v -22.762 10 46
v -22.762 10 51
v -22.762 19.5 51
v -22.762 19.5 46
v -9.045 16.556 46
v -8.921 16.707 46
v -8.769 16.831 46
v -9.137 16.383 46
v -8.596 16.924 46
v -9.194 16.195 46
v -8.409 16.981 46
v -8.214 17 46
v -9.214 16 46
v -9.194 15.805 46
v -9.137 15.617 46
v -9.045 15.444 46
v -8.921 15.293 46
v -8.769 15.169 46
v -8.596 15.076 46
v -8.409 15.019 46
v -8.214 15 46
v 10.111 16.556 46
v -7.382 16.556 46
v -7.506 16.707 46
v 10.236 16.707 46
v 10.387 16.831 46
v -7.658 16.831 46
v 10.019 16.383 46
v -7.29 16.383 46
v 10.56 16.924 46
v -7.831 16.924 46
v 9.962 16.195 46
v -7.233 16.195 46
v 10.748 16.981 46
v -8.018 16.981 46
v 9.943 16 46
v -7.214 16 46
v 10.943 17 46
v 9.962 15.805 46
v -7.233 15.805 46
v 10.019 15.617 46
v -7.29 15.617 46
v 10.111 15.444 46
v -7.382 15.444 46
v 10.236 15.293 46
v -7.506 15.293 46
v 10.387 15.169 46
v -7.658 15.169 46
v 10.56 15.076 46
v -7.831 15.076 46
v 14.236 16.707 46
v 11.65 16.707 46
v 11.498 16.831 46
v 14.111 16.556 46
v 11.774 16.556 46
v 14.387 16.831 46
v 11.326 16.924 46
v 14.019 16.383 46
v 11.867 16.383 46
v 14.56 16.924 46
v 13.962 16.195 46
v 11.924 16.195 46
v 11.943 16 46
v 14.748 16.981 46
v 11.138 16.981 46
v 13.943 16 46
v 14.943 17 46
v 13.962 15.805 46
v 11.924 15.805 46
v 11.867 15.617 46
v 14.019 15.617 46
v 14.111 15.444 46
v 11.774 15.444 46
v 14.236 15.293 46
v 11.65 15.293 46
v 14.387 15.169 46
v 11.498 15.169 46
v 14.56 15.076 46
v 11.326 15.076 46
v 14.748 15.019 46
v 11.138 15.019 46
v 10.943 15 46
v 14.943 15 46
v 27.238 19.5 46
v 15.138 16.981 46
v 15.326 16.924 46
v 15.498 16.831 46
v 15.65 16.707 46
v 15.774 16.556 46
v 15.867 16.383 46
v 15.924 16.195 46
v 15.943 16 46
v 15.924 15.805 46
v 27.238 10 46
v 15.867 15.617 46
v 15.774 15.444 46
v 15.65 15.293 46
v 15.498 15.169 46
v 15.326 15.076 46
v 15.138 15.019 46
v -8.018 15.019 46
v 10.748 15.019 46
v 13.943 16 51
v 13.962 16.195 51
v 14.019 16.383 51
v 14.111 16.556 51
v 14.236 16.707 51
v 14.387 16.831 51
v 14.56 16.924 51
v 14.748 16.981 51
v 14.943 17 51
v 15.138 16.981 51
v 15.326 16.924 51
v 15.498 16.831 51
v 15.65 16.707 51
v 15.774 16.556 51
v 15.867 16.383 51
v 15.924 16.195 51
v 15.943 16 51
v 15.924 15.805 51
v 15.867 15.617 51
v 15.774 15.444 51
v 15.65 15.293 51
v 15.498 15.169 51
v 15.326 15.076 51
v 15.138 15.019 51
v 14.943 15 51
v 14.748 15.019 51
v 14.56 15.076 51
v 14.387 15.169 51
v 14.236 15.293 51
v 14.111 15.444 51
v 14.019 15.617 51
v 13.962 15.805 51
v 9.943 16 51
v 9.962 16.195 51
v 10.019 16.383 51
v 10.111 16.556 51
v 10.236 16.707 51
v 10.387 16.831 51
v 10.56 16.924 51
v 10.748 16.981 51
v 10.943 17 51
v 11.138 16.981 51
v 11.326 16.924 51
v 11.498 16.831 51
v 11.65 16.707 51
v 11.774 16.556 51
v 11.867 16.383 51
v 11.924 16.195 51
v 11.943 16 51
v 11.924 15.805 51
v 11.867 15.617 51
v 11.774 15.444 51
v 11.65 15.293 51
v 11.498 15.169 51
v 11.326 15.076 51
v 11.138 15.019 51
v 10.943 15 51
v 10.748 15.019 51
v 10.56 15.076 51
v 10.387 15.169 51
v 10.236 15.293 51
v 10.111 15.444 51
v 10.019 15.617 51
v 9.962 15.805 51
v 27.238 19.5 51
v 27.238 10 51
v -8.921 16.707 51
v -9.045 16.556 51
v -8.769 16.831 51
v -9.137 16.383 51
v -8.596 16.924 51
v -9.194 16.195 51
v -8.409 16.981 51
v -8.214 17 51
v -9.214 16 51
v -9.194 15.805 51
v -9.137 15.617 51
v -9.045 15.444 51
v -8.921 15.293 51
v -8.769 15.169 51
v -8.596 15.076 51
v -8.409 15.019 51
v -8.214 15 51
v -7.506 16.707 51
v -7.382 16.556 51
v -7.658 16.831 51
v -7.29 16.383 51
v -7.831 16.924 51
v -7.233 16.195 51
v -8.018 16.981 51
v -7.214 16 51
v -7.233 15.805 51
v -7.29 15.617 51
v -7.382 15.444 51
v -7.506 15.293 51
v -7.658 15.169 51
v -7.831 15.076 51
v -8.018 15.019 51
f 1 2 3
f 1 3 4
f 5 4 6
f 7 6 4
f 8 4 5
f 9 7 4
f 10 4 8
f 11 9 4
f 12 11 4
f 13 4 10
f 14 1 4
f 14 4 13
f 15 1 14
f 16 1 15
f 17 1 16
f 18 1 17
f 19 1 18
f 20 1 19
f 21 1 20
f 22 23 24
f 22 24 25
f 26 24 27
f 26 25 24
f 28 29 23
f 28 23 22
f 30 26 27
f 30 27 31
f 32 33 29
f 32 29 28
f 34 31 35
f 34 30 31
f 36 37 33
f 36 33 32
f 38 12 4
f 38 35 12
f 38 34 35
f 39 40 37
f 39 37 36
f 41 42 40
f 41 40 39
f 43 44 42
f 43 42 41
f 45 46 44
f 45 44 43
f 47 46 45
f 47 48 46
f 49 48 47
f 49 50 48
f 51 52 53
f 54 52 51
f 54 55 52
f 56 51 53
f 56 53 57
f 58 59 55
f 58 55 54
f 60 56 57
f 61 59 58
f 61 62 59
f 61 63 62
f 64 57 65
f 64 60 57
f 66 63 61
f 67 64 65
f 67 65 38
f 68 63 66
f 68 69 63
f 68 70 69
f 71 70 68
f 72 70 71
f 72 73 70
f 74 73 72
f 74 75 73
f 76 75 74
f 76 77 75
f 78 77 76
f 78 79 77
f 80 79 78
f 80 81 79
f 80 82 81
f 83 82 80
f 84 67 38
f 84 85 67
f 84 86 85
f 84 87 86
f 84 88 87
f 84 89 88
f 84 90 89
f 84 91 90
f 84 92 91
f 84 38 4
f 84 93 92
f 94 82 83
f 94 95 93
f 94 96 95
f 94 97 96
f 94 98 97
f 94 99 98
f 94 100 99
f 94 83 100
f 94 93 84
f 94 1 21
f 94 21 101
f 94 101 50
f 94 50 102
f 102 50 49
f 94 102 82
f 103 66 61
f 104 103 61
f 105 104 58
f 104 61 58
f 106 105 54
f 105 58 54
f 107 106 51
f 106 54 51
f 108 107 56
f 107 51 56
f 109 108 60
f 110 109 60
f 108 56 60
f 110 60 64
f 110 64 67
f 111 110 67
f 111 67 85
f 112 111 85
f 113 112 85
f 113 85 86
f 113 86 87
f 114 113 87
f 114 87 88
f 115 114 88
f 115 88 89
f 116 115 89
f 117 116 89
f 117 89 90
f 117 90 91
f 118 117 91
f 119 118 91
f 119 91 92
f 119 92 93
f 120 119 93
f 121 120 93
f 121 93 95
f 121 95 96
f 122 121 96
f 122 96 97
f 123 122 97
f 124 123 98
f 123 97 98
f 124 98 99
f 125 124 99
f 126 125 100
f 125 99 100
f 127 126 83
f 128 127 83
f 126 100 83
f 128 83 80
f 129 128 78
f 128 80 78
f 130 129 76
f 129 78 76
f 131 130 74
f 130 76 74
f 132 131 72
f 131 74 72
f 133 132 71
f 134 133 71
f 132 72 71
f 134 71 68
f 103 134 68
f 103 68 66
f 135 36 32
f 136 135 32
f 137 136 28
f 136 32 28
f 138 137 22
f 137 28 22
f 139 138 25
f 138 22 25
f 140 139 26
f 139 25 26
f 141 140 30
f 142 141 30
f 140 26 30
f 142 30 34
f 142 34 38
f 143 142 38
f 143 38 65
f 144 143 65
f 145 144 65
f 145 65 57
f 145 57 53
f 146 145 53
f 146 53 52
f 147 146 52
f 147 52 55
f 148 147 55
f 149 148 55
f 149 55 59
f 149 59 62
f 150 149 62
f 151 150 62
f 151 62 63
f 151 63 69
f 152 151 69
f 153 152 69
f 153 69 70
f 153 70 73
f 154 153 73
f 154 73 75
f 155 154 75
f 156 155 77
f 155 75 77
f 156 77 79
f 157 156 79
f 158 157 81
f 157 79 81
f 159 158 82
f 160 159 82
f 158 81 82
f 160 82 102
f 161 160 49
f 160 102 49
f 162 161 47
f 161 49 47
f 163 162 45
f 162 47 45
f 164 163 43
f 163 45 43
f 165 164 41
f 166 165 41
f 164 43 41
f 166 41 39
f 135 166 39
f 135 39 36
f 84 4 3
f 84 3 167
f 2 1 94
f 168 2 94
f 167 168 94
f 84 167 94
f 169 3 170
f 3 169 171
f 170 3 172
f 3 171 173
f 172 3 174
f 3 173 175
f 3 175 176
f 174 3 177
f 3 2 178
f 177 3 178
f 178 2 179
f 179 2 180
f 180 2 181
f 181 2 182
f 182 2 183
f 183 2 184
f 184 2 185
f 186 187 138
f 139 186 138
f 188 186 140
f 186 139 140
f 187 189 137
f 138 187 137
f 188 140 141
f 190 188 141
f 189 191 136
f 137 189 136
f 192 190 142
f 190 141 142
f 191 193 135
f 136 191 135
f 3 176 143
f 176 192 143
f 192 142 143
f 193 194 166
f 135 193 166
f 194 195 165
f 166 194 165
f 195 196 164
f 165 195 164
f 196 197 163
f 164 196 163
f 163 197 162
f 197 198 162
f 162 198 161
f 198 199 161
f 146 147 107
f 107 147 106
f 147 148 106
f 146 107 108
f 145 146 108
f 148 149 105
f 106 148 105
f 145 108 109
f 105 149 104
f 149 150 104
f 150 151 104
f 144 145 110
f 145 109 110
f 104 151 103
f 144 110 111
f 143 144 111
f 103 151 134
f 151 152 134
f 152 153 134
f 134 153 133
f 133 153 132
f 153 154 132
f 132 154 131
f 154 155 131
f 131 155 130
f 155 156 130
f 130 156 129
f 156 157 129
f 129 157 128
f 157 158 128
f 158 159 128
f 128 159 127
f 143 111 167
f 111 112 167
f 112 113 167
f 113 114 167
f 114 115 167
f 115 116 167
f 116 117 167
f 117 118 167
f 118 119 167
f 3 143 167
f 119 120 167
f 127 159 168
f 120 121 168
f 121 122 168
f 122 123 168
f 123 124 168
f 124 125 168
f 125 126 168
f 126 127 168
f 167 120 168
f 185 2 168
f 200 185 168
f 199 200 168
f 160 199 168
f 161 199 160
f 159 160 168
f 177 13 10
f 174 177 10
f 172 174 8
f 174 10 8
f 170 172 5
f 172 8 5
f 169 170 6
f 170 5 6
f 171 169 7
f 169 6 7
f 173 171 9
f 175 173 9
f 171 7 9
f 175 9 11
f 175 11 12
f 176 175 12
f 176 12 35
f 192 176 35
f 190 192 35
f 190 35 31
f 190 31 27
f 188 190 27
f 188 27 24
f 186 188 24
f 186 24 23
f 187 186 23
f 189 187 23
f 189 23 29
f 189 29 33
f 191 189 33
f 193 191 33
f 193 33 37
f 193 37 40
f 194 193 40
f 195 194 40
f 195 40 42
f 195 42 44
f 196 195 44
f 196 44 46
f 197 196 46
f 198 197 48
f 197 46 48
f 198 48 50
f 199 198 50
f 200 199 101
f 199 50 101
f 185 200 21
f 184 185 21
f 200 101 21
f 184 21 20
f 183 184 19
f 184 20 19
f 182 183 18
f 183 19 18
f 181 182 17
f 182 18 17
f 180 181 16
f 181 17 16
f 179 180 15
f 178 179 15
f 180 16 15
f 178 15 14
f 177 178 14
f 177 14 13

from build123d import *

# Parameters (mm, degrees)
SKETCH1_W           = 50
SKETCH1_H           = 5
BOSS_EXTRUDE1_DEPTH = 9.5
CUT_EXTRUDE1_REACH  = 35.869
SKETCH2_R           = 1


with BuildPart() as part:
    # Sketch1 → Boss-Extrude1 (new body)
    with BuildSketch(Plane(origin=(0, 10, 0), x_dir=(1, 0, 0), z_dir=(0, 1, 0))):
        with Locations((2.237632925, -48.5)):
            Rectangle(SKETCH1_W, SKETCH1_H)
    extrude(amount=BOSS_EXTRUDE1_DEPTH)

    # Sketch2 → Cut-Extrude1 (cut, up to next)
    with BuildSketch(Plane(origin=(0, 0, 46), x_dir=(-1, 0, 0), z_dir=(0, 0, -1)), mode=Mode.PRIVATE) as cut_extrude1_sk1:
        with Locations((-14.942868758, 16)):
            Circle(SKETCH2_R)
    cut_extrude1_tool1 = extrude(cut_extrude1_sk1.sketch, amount=-CUT_EXTRUDE1_REACH, mode=Mode.PRIVATE) & part.part
    # Sketch2 → Cut-Extrude1 (cut, up to next)
    with BuildSketch(Plane(origin=(0, 0, 46), x_dir=(-1, 0, 0), z_dir=(0, 0, -1)), mode=Mode.PRIVATE) as cut_extrude1_sk2:
        with Locations((8.213561031, 16)):
            Circle(SKETCH2_R)
    cut_extrude1_tool2 = extrude(cut_extrude1_sk2.sketch, amount=-CUT_EXTRUDE1_REACH, mode=Mode.PRIVATE) & part.part
    # Sketch2 → Cut-Extrude1 (cut, up to next)
    with BuildSketch(Plane(origin=(0, 0, 46), x_dir=(-1, 0, 0), z_dir=(0, 0, -1)), mode=Mode.PRIVATE) as cut_extrude1_sk3:
        with Locations((-10.942868758, 16)):
            Circle(SKETCH2_R)
    cut_extrude1_tool3 = extrude(cut_extrude1_sk3.sketch, amount=-CUT_EXTRUDE1_REACH, mode=Mode.PRIVATE) & part.part
    add(cut_extrude1_tool1.solids().sort_by_distance((14.942869, 16, 46))[0], mode=Mode.SUBTRACT)
    add(cut_extrude1_tool2.solids().sort_by_distance((-8.213561, 16, 46))[0], mode=Mode.SUBTRACT)
    add(cut_extrude1_tool3.solids().sort_by_distance((10.942869, 16, 46))[0], mode=Mode.SUBTRACT)


solid = part.part
